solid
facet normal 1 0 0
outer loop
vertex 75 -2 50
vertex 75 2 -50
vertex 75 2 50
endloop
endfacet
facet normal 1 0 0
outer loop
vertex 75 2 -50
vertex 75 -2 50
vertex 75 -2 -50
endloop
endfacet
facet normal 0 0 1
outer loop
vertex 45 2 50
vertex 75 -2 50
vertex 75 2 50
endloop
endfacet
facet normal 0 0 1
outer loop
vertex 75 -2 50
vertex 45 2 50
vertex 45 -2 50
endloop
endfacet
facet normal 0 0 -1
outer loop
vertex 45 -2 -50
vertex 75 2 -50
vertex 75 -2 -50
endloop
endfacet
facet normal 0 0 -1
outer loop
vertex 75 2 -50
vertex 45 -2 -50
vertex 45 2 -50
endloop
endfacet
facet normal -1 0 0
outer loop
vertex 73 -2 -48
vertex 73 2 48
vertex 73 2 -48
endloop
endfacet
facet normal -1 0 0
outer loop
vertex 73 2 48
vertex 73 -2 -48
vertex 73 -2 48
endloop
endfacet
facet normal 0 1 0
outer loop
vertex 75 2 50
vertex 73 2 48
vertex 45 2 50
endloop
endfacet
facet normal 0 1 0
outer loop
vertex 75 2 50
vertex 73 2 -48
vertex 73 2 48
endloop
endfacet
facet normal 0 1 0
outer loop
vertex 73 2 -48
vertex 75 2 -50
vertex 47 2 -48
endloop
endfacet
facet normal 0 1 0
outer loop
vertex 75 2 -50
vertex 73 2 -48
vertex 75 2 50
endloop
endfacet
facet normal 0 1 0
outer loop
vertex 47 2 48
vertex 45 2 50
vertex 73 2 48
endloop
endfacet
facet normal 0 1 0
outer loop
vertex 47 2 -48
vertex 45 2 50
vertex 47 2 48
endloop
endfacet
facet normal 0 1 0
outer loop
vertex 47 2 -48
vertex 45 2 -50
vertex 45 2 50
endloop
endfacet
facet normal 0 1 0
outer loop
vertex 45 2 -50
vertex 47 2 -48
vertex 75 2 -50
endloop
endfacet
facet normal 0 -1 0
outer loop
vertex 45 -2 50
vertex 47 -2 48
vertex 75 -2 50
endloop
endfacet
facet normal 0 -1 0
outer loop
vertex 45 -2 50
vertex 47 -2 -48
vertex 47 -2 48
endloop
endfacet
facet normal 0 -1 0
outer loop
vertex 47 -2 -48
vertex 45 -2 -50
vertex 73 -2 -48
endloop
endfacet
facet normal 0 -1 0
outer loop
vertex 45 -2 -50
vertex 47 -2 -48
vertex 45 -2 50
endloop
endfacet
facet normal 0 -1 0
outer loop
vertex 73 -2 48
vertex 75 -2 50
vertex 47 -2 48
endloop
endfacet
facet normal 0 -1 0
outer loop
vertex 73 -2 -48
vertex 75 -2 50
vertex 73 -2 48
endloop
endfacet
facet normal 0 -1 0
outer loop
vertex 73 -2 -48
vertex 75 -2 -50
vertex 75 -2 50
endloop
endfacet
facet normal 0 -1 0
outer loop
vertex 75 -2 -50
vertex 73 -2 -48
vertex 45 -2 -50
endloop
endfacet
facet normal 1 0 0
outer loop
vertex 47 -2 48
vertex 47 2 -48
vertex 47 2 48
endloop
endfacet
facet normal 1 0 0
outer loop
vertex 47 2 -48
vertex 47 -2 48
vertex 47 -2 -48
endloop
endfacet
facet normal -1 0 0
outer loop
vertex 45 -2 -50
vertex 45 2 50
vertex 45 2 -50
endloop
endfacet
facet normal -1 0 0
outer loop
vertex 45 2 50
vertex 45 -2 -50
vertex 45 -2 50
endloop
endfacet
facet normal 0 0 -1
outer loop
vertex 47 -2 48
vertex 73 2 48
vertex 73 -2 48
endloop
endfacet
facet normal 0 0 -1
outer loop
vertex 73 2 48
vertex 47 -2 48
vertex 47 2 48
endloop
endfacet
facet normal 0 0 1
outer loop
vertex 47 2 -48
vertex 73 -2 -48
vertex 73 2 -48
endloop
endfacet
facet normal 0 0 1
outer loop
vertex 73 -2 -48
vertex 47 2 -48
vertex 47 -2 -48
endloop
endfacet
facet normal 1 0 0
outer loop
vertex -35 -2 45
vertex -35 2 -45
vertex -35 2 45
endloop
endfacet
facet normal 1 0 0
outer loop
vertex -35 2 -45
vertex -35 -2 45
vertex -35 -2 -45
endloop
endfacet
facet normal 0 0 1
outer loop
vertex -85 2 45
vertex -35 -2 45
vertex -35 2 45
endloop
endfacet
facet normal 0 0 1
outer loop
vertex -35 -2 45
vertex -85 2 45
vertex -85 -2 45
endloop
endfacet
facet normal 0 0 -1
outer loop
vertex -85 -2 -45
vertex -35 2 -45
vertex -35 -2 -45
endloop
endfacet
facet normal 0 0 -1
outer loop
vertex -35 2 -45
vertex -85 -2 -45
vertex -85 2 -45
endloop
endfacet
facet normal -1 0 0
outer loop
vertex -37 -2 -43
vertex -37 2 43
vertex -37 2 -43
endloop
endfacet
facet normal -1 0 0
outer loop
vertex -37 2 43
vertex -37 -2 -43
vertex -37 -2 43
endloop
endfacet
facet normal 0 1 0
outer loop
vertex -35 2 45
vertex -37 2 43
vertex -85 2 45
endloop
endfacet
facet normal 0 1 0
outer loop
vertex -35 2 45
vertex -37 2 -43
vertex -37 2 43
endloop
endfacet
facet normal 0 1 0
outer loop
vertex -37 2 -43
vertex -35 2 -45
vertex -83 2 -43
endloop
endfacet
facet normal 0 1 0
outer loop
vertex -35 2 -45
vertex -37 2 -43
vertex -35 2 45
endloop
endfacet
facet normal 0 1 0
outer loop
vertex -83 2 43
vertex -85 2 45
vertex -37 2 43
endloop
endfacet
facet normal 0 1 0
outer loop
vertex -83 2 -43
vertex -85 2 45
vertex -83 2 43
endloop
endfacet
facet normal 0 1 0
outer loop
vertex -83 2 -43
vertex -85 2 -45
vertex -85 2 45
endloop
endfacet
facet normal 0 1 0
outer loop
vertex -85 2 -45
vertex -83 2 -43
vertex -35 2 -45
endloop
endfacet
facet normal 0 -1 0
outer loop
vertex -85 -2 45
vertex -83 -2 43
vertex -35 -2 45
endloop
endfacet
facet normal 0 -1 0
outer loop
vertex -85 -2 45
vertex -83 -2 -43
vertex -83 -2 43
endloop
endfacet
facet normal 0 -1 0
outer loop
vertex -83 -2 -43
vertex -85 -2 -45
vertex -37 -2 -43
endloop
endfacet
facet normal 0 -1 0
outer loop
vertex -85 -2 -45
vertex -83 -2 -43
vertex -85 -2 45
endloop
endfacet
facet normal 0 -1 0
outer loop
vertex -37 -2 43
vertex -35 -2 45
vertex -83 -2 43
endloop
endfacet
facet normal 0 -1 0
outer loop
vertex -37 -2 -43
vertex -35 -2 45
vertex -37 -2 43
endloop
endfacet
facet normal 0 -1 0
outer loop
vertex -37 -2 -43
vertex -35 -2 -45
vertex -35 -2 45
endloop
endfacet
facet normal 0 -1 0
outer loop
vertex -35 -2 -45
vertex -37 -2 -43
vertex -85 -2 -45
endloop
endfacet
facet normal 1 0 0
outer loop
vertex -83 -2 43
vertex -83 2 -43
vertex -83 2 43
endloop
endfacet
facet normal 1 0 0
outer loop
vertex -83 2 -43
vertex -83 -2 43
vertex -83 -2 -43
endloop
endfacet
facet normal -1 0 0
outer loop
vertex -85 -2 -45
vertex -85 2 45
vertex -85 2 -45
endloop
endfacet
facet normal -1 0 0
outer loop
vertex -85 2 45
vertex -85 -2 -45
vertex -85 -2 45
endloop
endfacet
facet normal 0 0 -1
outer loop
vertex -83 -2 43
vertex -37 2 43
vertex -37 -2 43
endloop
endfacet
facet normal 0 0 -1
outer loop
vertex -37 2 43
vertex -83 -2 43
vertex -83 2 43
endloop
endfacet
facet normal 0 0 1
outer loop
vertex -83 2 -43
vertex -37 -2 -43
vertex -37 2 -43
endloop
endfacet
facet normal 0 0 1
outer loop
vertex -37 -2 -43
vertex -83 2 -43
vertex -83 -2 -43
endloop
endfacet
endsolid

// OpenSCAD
module genericframe(width = 40, height = 80, frame_width = 2, frame_depth = 4)
{
    translate([width/2-frame_width/2,0,0]) cube([frame_width,4,height], center=true);
    translate([-width/2+frame_width/2,0,0]) cube([frame_width,4,height], center=true);
    translate([0,0,height/2-frame_width/2]) rotate([0,90,0]) cube([frame_width,frame_depth,width], center=true);
    translate([0,0,-height/2+frame_width/2]) rotate([0,90,0]) cube([frame_width,frame_depth,width], center=true);
}

translate([60,0,0]) genericframe(30, 100);
translate([-60,0,0]) genericframe(50, 90);
